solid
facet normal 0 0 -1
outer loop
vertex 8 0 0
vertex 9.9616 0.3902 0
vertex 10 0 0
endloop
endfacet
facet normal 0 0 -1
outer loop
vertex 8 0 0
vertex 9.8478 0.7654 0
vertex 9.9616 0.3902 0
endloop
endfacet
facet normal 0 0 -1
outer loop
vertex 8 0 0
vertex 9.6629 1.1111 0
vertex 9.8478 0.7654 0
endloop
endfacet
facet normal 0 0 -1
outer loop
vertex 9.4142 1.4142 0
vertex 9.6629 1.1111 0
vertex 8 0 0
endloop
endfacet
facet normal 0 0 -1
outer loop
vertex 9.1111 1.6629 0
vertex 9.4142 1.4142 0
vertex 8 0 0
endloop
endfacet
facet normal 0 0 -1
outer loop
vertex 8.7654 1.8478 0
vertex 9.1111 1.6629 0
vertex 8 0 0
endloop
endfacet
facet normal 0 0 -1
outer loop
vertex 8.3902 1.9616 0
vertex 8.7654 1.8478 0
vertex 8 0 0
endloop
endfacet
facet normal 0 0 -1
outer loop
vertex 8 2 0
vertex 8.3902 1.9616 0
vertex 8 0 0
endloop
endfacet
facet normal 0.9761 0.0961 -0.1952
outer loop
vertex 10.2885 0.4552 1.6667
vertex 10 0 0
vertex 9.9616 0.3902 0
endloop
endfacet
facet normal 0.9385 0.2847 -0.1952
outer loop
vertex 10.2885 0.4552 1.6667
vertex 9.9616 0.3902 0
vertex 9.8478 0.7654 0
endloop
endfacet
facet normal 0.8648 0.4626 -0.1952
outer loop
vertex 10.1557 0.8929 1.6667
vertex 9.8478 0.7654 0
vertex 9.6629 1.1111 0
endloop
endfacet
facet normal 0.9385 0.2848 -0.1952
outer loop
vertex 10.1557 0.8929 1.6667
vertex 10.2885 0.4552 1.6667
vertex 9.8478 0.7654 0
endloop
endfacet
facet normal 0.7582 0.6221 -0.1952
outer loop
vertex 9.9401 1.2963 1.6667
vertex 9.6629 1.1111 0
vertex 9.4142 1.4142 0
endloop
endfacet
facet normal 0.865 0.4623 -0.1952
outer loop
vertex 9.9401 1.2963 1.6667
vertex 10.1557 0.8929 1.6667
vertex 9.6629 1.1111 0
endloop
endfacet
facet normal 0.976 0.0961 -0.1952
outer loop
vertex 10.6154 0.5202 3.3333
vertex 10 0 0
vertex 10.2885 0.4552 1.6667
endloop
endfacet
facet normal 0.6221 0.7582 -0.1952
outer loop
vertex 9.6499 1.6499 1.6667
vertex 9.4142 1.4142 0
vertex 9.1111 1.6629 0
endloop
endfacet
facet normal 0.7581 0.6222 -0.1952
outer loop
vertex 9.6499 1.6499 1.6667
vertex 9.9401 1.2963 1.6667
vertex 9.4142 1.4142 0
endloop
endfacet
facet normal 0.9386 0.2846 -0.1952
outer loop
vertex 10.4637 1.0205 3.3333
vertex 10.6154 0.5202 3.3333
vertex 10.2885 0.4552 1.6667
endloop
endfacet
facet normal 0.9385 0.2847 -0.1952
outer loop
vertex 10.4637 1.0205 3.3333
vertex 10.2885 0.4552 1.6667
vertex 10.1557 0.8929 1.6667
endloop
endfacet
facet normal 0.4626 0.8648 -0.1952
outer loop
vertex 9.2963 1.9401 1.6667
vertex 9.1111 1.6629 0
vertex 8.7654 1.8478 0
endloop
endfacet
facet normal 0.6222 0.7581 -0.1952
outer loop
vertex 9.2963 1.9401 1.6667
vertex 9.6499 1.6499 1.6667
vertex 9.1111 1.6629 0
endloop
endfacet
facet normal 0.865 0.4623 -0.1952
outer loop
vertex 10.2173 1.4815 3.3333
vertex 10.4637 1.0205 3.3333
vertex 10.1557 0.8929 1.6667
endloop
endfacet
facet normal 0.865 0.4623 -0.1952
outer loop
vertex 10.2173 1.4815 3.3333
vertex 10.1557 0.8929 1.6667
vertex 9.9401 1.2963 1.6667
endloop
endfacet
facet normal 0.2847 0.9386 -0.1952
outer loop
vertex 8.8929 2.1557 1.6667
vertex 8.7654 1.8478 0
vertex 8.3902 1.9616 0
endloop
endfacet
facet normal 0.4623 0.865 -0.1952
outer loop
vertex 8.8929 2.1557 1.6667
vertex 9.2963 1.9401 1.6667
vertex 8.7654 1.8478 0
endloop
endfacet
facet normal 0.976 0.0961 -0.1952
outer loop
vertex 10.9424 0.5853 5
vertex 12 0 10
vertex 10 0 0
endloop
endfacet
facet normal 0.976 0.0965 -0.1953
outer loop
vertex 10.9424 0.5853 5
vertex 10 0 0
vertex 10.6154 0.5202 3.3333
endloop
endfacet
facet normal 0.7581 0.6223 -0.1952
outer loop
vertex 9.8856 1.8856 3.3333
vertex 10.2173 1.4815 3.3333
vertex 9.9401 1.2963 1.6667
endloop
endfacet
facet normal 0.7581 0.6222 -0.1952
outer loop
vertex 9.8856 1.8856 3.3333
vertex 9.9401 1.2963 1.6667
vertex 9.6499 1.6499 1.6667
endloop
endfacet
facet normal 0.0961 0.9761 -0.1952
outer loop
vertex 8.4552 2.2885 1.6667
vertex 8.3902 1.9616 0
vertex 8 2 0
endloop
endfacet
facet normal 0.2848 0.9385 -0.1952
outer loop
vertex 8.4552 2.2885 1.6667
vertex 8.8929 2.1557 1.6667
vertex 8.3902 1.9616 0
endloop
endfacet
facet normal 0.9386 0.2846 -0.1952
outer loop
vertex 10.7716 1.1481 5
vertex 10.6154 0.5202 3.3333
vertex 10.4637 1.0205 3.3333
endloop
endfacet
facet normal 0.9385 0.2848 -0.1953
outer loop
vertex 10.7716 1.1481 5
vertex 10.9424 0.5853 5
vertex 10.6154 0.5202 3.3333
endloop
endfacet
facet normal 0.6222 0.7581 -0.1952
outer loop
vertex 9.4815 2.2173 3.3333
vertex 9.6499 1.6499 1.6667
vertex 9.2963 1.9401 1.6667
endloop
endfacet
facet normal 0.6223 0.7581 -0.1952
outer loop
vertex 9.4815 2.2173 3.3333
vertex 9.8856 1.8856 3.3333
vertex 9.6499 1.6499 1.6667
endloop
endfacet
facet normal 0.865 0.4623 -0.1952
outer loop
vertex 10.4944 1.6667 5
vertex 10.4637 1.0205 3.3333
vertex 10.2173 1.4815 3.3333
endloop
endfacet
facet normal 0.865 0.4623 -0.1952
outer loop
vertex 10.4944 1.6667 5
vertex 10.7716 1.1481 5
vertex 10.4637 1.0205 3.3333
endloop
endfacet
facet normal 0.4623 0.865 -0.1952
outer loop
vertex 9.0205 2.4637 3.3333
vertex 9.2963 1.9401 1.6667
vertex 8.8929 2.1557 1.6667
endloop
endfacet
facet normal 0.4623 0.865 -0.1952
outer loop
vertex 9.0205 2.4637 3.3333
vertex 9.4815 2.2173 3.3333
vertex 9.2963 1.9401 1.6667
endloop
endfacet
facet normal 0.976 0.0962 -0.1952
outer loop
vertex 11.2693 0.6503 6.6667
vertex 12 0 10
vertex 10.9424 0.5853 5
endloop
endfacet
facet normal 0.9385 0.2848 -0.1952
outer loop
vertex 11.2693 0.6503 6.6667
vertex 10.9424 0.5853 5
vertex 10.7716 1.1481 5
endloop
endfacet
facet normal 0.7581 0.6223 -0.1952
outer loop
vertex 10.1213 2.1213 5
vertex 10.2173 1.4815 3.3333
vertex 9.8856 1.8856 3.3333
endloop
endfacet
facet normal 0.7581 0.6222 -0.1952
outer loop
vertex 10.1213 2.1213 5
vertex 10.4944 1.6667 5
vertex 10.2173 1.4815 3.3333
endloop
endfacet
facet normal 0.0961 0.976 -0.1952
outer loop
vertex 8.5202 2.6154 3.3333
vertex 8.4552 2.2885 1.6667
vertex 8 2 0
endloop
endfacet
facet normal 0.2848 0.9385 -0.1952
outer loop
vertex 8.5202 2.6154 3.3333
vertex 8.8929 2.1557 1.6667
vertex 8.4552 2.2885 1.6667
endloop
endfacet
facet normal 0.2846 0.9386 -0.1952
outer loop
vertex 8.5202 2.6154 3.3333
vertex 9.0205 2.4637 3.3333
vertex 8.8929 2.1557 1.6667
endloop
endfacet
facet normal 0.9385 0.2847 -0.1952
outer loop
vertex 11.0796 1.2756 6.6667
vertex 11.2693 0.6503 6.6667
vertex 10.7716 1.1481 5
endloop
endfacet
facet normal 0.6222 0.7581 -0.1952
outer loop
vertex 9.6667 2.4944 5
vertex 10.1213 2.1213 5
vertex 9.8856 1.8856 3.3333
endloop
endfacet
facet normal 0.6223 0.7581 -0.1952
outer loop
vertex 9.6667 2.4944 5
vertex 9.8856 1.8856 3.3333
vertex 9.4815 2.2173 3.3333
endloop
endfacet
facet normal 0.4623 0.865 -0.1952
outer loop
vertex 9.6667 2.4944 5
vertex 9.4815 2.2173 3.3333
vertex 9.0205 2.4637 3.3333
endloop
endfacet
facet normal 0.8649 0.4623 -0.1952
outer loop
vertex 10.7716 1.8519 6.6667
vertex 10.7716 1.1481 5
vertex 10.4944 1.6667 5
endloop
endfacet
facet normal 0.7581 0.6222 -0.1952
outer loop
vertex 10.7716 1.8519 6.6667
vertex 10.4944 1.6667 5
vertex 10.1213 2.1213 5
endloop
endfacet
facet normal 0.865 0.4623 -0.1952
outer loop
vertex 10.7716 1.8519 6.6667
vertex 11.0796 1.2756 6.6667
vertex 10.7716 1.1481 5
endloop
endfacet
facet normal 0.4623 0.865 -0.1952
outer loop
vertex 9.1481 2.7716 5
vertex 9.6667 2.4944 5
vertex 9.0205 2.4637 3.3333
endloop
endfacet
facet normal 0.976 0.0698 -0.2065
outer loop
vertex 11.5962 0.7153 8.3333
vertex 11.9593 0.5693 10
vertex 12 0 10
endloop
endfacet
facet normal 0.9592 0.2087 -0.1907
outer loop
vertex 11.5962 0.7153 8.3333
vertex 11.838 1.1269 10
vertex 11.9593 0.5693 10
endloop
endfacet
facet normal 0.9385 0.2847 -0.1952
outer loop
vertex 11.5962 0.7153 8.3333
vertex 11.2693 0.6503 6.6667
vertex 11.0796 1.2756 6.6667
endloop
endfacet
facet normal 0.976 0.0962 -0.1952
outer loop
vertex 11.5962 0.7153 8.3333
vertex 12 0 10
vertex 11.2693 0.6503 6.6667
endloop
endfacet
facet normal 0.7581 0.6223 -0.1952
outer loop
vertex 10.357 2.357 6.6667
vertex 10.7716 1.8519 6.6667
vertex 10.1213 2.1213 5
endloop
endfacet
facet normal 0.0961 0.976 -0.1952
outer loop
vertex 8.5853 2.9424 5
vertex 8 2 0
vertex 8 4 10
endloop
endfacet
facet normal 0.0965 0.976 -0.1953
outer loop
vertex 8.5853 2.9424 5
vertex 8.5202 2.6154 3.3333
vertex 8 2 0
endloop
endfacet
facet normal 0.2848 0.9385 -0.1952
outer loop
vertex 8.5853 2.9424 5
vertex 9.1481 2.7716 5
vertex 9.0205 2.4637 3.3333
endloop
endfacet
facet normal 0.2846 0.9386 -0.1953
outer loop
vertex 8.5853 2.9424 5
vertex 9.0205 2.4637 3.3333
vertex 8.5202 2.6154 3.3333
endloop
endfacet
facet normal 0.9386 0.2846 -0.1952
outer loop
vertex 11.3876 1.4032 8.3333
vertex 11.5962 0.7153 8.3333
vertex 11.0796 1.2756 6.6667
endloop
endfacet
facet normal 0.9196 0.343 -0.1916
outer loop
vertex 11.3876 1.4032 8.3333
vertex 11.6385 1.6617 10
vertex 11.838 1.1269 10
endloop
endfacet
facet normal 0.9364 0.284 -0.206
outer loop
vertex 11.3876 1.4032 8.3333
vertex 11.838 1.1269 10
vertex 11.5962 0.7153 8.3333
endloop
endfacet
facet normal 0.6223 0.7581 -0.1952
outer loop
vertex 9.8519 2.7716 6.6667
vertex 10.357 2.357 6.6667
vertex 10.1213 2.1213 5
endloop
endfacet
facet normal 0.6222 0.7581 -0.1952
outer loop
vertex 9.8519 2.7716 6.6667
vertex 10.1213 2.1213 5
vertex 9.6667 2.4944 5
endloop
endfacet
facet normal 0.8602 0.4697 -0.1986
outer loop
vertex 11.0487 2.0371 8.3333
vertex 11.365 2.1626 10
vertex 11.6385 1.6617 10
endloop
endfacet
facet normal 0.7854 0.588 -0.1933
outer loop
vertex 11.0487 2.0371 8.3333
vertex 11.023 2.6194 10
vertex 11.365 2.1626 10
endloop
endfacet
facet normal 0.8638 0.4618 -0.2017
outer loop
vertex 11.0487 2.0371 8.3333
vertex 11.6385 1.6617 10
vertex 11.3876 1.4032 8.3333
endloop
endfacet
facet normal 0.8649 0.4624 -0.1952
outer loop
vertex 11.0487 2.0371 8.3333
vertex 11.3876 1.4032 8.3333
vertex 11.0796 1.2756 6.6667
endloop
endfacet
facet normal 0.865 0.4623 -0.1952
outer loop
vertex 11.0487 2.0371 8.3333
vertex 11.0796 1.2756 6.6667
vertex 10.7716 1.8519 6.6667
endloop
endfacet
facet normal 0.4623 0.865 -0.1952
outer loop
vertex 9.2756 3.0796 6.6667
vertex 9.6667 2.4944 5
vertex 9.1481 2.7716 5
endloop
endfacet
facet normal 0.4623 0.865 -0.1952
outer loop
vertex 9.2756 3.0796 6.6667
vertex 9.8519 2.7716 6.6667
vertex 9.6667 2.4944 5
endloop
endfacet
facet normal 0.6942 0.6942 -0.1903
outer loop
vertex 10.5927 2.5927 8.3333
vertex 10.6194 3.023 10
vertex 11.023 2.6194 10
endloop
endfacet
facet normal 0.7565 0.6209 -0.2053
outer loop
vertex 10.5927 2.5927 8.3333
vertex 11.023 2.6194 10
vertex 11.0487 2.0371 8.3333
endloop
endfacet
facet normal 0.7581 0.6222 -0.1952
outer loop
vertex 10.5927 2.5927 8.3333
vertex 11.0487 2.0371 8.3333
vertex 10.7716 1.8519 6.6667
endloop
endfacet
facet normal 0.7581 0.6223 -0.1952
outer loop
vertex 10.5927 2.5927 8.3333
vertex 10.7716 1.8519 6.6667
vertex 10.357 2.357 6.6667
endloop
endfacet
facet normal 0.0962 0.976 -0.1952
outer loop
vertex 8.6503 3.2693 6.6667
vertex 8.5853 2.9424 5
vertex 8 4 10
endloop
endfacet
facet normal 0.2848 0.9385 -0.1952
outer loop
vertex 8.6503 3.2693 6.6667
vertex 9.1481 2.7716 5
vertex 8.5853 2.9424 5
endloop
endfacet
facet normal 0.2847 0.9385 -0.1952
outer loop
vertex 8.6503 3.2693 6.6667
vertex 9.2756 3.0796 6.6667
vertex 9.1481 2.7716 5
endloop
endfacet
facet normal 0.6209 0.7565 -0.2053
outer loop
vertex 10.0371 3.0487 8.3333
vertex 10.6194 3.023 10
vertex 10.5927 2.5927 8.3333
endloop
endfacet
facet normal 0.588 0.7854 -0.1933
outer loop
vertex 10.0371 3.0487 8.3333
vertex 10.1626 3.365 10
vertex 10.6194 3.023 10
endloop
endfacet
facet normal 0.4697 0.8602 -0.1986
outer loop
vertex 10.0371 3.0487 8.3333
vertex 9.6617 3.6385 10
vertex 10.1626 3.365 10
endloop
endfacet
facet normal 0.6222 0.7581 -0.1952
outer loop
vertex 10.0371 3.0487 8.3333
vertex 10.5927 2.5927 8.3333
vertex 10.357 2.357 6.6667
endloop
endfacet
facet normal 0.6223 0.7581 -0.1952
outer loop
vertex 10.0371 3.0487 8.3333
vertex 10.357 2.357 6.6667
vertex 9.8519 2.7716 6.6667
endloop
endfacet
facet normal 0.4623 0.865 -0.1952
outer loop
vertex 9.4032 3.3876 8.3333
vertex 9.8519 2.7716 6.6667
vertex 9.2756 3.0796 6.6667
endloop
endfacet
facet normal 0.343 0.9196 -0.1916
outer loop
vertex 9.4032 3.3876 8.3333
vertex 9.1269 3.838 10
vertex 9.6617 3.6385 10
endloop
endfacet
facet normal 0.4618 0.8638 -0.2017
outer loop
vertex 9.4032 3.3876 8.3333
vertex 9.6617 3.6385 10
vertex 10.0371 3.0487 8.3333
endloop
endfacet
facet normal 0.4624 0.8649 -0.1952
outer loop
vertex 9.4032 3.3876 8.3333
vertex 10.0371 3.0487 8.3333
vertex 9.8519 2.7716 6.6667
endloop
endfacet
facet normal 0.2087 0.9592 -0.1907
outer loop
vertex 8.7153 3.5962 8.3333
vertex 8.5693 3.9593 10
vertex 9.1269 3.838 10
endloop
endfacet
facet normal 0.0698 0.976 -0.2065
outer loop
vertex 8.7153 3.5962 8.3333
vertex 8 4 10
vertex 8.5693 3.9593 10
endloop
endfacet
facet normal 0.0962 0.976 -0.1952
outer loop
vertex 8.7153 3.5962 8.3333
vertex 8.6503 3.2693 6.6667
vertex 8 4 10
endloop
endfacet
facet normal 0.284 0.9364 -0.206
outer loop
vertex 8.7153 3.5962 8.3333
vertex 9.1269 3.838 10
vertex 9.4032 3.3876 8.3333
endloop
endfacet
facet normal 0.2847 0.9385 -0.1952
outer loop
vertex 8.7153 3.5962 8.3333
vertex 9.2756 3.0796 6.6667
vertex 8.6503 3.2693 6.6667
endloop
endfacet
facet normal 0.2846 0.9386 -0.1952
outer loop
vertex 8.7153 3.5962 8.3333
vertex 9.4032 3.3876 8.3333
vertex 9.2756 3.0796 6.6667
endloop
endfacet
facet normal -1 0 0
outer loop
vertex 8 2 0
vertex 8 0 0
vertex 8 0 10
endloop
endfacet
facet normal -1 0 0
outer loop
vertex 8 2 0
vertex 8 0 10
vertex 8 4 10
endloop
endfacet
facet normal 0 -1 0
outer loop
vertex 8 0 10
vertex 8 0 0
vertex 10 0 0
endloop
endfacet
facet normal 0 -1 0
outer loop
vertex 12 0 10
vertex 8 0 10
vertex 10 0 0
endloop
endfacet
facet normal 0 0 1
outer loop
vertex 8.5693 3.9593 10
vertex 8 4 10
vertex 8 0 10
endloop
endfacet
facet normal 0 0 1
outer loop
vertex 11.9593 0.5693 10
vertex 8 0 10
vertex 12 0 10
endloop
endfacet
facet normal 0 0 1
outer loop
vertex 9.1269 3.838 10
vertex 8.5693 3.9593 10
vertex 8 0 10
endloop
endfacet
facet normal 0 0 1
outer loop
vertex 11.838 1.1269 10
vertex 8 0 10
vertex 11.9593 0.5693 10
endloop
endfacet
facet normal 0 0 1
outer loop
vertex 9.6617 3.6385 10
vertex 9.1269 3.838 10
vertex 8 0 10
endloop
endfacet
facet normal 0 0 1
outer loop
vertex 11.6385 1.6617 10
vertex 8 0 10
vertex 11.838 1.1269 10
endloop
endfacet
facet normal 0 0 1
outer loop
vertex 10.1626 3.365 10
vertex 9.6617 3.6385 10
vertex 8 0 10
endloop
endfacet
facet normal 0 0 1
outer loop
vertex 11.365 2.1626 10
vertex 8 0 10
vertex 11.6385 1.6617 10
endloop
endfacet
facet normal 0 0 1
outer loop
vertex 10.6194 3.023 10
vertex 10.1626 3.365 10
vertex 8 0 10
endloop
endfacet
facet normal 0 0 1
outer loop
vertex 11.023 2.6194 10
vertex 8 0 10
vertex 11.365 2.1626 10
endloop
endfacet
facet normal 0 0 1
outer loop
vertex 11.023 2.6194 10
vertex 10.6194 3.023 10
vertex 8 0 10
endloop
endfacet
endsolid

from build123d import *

# Parameters (mm, degrees)
BOX001_W     = 10
BOX001_H     = 10
BOX001_DEPTH = 10


with BuildPart() as cube001:
    # Box001 → Box001 (new body)
    with BuildSketch(Plane.XY):
        with Locations((5, 5)):
            Rectangle(BOX001_W, BOX001_H)
    extrude(amount=BOX001_DEPTH)


with BuildPart() as common001:
    # Cone → Cone (revolve)
    with BuildSketch(Plane.XZ):
        Polygon((0, 0), (2, 0), (4, 10), (0, 10), align=None)
    revolve(axis=Axis((0, 0, 0), (0, 0, 1)))

    # Common001: intersect Cube001
    add(cube001.part, mode=Mode.INTERSECT)


with BuildPart() as common001_1:
    # Common001 placement: moved
    add(common001.part.moved(Location((8, 0, 0))))


solid = common001_1.part
